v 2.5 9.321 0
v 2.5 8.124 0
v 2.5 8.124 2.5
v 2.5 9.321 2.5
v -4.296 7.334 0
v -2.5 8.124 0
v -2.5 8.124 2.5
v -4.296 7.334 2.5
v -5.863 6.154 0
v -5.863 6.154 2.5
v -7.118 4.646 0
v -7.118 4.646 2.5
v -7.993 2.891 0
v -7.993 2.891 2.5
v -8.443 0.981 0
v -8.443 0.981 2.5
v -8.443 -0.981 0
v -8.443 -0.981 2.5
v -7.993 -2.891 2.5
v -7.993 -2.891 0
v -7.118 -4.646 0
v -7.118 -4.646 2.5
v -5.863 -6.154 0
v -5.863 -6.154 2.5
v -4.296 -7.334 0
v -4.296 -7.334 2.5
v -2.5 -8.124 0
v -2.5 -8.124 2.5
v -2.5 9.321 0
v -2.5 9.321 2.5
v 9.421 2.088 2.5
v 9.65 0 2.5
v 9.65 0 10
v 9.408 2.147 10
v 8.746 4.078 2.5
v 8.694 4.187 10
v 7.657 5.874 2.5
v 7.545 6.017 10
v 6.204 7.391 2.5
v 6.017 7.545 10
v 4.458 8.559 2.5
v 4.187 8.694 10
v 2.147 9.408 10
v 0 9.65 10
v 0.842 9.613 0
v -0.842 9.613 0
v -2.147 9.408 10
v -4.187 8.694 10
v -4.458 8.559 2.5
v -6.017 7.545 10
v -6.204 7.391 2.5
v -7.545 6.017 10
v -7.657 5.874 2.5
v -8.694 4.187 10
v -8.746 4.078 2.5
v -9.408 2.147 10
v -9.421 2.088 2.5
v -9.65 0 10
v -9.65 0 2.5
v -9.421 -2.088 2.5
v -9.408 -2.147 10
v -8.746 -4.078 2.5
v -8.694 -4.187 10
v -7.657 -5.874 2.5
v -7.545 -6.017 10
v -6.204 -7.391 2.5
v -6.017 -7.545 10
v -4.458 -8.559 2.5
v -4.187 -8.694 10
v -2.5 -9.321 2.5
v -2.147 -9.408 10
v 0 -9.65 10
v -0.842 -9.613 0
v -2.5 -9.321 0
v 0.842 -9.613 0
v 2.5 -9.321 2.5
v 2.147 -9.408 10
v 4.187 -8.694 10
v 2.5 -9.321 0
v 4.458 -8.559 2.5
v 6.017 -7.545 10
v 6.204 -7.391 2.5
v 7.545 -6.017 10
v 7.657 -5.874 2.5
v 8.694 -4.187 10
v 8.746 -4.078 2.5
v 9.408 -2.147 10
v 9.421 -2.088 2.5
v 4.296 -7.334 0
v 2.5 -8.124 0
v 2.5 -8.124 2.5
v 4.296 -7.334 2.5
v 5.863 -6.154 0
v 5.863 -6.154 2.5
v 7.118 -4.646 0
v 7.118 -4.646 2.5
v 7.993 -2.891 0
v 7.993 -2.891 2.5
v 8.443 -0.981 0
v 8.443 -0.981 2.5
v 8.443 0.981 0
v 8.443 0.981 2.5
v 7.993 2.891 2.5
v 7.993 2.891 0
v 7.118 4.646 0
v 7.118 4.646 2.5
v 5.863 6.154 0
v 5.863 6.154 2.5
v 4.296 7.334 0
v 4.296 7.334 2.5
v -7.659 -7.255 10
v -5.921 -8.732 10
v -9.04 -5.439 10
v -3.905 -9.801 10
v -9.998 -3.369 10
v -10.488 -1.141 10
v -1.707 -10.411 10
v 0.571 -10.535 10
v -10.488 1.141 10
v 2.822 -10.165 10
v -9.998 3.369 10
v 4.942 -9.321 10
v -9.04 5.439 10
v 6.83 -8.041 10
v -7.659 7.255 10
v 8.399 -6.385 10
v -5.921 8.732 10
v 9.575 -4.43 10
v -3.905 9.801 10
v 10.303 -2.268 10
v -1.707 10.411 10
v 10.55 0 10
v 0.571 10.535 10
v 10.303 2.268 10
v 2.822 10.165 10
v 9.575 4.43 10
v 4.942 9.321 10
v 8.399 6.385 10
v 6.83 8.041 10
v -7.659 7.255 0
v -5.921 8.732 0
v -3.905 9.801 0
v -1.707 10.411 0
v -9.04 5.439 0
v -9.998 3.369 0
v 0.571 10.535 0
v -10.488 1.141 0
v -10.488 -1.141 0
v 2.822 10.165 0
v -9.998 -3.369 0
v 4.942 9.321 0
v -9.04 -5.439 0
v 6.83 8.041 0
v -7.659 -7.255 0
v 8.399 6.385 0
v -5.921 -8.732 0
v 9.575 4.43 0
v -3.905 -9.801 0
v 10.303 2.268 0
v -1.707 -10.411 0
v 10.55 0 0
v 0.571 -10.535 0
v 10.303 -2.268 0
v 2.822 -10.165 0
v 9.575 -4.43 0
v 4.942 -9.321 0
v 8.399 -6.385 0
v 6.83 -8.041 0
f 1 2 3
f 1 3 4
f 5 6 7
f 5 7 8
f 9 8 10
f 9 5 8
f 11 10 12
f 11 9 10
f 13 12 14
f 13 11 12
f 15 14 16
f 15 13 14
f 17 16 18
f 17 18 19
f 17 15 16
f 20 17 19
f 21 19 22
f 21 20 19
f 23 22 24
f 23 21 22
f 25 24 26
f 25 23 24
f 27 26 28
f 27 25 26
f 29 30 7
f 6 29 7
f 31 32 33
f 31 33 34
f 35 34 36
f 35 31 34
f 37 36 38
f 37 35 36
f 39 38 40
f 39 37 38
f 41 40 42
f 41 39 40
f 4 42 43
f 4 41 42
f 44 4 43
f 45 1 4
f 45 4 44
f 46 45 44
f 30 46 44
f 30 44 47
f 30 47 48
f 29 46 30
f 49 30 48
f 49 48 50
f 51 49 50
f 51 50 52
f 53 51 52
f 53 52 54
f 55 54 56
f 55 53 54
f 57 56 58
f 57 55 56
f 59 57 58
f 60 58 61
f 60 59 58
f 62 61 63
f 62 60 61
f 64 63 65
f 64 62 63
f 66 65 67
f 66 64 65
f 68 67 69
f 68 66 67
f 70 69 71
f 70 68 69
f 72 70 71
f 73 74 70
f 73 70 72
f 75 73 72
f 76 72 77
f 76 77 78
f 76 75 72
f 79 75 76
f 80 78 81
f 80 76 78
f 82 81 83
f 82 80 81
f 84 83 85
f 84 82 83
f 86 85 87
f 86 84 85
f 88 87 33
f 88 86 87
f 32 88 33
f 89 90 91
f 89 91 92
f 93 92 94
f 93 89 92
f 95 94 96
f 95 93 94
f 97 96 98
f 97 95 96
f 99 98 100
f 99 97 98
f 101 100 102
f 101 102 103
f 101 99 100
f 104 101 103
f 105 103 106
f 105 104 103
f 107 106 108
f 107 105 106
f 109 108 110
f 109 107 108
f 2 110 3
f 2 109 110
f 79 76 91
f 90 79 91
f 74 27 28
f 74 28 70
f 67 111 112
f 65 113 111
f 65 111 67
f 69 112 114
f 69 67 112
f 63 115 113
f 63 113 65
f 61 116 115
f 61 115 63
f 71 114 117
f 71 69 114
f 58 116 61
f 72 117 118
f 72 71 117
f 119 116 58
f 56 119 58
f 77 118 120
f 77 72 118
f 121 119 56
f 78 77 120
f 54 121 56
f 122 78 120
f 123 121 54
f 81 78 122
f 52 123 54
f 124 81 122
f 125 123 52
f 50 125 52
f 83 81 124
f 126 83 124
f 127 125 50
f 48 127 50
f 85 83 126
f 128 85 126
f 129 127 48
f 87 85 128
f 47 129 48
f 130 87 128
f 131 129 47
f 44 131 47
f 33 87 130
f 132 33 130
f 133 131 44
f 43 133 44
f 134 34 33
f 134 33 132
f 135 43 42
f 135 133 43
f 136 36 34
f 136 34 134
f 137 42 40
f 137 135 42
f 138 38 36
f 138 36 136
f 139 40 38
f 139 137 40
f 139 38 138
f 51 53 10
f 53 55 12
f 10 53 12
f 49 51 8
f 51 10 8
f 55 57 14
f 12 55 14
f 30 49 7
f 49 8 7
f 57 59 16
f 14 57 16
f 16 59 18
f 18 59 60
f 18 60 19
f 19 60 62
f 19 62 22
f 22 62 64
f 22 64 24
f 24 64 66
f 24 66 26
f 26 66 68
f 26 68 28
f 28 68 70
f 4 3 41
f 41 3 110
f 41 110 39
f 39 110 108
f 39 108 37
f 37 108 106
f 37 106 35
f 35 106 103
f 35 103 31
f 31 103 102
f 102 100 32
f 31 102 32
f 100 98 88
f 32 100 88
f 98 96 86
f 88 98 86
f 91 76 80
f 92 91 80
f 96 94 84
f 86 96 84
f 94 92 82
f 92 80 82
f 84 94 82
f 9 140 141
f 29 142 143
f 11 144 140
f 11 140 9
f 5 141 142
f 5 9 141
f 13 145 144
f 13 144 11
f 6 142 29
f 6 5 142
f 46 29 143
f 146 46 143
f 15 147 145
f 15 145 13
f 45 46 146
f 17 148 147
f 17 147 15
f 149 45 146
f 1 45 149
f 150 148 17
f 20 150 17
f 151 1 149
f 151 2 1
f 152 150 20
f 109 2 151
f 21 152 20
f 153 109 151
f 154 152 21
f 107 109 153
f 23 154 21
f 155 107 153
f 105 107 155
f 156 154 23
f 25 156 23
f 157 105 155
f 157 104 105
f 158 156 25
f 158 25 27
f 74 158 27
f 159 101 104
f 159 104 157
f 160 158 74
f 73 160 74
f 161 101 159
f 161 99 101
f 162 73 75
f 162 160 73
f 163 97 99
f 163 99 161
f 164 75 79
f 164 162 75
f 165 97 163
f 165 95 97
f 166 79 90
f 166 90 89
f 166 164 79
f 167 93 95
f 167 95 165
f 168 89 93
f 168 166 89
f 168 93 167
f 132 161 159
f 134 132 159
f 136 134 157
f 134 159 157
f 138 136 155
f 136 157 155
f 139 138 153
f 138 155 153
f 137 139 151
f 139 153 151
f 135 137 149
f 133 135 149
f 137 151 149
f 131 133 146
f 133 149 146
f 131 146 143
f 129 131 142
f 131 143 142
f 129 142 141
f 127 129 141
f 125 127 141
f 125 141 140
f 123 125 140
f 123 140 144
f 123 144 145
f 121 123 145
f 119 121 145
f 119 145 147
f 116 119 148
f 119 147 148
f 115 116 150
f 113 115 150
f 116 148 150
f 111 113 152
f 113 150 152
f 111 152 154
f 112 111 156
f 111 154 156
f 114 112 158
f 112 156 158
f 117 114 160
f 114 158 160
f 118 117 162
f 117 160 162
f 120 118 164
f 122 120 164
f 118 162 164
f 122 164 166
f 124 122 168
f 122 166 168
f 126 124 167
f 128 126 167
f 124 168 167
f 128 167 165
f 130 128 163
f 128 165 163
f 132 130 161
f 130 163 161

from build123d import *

# Parameters (mm, degrees)
F0_R     = 10.55
F0_R_2   = 9.65
F1_DEPTH = 10
F3_DEPTH = 2.5


with BuildPart() as f1:
    # F0 (on Top) → F1 (new body)
    with BuildSketch(Plane.XY):
        Circle(F0_R)
        Circle(F0_R_2, mode=Mode.SUBTRACT)
    extrude(amount=F1_DEPTH)

    # F2 (on face) → F3 (join)
    with BuildSketch(Plane(origin=(0, 0, 0), x_dir=(1, 0, 0), z_dir=(0, 0, -1))):
        with BuildLine():
            ThreePointArc((-2.5, -8.124038), (-8.5, 0), (-2.5, 8.124038))
            Line((-2.5, 8.124038), (-2.5, 9.320542))
            ThreePointArc((-2.5, 9.320542), (-9.65, 0), (-2.5, -9.320542))
            Line((-2.5, -9.320542), (-2.5, -8.124038))
        make_face()
        with BuildLine():
            ThreePointArc((2.5, -9.320542), (9.65, 0), (2.5, 9.320542))
            Line((2.5, 9.320542), (2.5, 8.124038))
            ThreePointArc((2.5, 8.124038), (8.5, 0), (2.5, -8.124038))
            Line((2.5, -8.124038), (2.5, -9.320542))
        make_face()
    extrude(amount=-F3_DEPTH)


solid = f1.part
